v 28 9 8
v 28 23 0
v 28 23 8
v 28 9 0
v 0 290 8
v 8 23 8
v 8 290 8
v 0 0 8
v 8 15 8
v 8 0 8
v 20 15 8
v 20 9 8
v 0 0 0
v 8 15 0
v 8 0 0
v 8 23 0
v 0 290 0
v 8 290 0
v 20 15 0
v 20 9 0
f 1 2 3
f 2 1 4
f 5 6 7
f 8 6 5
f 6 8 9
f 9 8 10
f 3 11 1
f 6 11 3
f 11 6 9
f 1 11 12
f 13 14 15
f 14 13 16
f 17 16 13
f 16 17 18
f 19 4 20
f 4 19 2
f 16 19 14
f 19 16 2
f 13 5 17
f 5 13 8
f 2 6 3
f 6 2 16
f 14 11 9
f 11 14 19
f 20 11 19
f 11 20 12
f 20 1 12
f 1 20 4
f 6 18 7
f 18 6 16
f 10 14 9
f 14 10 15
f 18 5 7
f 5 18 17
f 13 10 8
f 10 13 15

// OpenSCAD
translate([0,0,0]) {
    union() {
        cube([8, 290, 8], false);
        translate([0,15,0]) {
            union() {
                cube([28, 8, 8], false);
                 translate([20,-6,0]) {
                    cube([8, 6, 8], false);
                 }
            }
        }
    }
}
